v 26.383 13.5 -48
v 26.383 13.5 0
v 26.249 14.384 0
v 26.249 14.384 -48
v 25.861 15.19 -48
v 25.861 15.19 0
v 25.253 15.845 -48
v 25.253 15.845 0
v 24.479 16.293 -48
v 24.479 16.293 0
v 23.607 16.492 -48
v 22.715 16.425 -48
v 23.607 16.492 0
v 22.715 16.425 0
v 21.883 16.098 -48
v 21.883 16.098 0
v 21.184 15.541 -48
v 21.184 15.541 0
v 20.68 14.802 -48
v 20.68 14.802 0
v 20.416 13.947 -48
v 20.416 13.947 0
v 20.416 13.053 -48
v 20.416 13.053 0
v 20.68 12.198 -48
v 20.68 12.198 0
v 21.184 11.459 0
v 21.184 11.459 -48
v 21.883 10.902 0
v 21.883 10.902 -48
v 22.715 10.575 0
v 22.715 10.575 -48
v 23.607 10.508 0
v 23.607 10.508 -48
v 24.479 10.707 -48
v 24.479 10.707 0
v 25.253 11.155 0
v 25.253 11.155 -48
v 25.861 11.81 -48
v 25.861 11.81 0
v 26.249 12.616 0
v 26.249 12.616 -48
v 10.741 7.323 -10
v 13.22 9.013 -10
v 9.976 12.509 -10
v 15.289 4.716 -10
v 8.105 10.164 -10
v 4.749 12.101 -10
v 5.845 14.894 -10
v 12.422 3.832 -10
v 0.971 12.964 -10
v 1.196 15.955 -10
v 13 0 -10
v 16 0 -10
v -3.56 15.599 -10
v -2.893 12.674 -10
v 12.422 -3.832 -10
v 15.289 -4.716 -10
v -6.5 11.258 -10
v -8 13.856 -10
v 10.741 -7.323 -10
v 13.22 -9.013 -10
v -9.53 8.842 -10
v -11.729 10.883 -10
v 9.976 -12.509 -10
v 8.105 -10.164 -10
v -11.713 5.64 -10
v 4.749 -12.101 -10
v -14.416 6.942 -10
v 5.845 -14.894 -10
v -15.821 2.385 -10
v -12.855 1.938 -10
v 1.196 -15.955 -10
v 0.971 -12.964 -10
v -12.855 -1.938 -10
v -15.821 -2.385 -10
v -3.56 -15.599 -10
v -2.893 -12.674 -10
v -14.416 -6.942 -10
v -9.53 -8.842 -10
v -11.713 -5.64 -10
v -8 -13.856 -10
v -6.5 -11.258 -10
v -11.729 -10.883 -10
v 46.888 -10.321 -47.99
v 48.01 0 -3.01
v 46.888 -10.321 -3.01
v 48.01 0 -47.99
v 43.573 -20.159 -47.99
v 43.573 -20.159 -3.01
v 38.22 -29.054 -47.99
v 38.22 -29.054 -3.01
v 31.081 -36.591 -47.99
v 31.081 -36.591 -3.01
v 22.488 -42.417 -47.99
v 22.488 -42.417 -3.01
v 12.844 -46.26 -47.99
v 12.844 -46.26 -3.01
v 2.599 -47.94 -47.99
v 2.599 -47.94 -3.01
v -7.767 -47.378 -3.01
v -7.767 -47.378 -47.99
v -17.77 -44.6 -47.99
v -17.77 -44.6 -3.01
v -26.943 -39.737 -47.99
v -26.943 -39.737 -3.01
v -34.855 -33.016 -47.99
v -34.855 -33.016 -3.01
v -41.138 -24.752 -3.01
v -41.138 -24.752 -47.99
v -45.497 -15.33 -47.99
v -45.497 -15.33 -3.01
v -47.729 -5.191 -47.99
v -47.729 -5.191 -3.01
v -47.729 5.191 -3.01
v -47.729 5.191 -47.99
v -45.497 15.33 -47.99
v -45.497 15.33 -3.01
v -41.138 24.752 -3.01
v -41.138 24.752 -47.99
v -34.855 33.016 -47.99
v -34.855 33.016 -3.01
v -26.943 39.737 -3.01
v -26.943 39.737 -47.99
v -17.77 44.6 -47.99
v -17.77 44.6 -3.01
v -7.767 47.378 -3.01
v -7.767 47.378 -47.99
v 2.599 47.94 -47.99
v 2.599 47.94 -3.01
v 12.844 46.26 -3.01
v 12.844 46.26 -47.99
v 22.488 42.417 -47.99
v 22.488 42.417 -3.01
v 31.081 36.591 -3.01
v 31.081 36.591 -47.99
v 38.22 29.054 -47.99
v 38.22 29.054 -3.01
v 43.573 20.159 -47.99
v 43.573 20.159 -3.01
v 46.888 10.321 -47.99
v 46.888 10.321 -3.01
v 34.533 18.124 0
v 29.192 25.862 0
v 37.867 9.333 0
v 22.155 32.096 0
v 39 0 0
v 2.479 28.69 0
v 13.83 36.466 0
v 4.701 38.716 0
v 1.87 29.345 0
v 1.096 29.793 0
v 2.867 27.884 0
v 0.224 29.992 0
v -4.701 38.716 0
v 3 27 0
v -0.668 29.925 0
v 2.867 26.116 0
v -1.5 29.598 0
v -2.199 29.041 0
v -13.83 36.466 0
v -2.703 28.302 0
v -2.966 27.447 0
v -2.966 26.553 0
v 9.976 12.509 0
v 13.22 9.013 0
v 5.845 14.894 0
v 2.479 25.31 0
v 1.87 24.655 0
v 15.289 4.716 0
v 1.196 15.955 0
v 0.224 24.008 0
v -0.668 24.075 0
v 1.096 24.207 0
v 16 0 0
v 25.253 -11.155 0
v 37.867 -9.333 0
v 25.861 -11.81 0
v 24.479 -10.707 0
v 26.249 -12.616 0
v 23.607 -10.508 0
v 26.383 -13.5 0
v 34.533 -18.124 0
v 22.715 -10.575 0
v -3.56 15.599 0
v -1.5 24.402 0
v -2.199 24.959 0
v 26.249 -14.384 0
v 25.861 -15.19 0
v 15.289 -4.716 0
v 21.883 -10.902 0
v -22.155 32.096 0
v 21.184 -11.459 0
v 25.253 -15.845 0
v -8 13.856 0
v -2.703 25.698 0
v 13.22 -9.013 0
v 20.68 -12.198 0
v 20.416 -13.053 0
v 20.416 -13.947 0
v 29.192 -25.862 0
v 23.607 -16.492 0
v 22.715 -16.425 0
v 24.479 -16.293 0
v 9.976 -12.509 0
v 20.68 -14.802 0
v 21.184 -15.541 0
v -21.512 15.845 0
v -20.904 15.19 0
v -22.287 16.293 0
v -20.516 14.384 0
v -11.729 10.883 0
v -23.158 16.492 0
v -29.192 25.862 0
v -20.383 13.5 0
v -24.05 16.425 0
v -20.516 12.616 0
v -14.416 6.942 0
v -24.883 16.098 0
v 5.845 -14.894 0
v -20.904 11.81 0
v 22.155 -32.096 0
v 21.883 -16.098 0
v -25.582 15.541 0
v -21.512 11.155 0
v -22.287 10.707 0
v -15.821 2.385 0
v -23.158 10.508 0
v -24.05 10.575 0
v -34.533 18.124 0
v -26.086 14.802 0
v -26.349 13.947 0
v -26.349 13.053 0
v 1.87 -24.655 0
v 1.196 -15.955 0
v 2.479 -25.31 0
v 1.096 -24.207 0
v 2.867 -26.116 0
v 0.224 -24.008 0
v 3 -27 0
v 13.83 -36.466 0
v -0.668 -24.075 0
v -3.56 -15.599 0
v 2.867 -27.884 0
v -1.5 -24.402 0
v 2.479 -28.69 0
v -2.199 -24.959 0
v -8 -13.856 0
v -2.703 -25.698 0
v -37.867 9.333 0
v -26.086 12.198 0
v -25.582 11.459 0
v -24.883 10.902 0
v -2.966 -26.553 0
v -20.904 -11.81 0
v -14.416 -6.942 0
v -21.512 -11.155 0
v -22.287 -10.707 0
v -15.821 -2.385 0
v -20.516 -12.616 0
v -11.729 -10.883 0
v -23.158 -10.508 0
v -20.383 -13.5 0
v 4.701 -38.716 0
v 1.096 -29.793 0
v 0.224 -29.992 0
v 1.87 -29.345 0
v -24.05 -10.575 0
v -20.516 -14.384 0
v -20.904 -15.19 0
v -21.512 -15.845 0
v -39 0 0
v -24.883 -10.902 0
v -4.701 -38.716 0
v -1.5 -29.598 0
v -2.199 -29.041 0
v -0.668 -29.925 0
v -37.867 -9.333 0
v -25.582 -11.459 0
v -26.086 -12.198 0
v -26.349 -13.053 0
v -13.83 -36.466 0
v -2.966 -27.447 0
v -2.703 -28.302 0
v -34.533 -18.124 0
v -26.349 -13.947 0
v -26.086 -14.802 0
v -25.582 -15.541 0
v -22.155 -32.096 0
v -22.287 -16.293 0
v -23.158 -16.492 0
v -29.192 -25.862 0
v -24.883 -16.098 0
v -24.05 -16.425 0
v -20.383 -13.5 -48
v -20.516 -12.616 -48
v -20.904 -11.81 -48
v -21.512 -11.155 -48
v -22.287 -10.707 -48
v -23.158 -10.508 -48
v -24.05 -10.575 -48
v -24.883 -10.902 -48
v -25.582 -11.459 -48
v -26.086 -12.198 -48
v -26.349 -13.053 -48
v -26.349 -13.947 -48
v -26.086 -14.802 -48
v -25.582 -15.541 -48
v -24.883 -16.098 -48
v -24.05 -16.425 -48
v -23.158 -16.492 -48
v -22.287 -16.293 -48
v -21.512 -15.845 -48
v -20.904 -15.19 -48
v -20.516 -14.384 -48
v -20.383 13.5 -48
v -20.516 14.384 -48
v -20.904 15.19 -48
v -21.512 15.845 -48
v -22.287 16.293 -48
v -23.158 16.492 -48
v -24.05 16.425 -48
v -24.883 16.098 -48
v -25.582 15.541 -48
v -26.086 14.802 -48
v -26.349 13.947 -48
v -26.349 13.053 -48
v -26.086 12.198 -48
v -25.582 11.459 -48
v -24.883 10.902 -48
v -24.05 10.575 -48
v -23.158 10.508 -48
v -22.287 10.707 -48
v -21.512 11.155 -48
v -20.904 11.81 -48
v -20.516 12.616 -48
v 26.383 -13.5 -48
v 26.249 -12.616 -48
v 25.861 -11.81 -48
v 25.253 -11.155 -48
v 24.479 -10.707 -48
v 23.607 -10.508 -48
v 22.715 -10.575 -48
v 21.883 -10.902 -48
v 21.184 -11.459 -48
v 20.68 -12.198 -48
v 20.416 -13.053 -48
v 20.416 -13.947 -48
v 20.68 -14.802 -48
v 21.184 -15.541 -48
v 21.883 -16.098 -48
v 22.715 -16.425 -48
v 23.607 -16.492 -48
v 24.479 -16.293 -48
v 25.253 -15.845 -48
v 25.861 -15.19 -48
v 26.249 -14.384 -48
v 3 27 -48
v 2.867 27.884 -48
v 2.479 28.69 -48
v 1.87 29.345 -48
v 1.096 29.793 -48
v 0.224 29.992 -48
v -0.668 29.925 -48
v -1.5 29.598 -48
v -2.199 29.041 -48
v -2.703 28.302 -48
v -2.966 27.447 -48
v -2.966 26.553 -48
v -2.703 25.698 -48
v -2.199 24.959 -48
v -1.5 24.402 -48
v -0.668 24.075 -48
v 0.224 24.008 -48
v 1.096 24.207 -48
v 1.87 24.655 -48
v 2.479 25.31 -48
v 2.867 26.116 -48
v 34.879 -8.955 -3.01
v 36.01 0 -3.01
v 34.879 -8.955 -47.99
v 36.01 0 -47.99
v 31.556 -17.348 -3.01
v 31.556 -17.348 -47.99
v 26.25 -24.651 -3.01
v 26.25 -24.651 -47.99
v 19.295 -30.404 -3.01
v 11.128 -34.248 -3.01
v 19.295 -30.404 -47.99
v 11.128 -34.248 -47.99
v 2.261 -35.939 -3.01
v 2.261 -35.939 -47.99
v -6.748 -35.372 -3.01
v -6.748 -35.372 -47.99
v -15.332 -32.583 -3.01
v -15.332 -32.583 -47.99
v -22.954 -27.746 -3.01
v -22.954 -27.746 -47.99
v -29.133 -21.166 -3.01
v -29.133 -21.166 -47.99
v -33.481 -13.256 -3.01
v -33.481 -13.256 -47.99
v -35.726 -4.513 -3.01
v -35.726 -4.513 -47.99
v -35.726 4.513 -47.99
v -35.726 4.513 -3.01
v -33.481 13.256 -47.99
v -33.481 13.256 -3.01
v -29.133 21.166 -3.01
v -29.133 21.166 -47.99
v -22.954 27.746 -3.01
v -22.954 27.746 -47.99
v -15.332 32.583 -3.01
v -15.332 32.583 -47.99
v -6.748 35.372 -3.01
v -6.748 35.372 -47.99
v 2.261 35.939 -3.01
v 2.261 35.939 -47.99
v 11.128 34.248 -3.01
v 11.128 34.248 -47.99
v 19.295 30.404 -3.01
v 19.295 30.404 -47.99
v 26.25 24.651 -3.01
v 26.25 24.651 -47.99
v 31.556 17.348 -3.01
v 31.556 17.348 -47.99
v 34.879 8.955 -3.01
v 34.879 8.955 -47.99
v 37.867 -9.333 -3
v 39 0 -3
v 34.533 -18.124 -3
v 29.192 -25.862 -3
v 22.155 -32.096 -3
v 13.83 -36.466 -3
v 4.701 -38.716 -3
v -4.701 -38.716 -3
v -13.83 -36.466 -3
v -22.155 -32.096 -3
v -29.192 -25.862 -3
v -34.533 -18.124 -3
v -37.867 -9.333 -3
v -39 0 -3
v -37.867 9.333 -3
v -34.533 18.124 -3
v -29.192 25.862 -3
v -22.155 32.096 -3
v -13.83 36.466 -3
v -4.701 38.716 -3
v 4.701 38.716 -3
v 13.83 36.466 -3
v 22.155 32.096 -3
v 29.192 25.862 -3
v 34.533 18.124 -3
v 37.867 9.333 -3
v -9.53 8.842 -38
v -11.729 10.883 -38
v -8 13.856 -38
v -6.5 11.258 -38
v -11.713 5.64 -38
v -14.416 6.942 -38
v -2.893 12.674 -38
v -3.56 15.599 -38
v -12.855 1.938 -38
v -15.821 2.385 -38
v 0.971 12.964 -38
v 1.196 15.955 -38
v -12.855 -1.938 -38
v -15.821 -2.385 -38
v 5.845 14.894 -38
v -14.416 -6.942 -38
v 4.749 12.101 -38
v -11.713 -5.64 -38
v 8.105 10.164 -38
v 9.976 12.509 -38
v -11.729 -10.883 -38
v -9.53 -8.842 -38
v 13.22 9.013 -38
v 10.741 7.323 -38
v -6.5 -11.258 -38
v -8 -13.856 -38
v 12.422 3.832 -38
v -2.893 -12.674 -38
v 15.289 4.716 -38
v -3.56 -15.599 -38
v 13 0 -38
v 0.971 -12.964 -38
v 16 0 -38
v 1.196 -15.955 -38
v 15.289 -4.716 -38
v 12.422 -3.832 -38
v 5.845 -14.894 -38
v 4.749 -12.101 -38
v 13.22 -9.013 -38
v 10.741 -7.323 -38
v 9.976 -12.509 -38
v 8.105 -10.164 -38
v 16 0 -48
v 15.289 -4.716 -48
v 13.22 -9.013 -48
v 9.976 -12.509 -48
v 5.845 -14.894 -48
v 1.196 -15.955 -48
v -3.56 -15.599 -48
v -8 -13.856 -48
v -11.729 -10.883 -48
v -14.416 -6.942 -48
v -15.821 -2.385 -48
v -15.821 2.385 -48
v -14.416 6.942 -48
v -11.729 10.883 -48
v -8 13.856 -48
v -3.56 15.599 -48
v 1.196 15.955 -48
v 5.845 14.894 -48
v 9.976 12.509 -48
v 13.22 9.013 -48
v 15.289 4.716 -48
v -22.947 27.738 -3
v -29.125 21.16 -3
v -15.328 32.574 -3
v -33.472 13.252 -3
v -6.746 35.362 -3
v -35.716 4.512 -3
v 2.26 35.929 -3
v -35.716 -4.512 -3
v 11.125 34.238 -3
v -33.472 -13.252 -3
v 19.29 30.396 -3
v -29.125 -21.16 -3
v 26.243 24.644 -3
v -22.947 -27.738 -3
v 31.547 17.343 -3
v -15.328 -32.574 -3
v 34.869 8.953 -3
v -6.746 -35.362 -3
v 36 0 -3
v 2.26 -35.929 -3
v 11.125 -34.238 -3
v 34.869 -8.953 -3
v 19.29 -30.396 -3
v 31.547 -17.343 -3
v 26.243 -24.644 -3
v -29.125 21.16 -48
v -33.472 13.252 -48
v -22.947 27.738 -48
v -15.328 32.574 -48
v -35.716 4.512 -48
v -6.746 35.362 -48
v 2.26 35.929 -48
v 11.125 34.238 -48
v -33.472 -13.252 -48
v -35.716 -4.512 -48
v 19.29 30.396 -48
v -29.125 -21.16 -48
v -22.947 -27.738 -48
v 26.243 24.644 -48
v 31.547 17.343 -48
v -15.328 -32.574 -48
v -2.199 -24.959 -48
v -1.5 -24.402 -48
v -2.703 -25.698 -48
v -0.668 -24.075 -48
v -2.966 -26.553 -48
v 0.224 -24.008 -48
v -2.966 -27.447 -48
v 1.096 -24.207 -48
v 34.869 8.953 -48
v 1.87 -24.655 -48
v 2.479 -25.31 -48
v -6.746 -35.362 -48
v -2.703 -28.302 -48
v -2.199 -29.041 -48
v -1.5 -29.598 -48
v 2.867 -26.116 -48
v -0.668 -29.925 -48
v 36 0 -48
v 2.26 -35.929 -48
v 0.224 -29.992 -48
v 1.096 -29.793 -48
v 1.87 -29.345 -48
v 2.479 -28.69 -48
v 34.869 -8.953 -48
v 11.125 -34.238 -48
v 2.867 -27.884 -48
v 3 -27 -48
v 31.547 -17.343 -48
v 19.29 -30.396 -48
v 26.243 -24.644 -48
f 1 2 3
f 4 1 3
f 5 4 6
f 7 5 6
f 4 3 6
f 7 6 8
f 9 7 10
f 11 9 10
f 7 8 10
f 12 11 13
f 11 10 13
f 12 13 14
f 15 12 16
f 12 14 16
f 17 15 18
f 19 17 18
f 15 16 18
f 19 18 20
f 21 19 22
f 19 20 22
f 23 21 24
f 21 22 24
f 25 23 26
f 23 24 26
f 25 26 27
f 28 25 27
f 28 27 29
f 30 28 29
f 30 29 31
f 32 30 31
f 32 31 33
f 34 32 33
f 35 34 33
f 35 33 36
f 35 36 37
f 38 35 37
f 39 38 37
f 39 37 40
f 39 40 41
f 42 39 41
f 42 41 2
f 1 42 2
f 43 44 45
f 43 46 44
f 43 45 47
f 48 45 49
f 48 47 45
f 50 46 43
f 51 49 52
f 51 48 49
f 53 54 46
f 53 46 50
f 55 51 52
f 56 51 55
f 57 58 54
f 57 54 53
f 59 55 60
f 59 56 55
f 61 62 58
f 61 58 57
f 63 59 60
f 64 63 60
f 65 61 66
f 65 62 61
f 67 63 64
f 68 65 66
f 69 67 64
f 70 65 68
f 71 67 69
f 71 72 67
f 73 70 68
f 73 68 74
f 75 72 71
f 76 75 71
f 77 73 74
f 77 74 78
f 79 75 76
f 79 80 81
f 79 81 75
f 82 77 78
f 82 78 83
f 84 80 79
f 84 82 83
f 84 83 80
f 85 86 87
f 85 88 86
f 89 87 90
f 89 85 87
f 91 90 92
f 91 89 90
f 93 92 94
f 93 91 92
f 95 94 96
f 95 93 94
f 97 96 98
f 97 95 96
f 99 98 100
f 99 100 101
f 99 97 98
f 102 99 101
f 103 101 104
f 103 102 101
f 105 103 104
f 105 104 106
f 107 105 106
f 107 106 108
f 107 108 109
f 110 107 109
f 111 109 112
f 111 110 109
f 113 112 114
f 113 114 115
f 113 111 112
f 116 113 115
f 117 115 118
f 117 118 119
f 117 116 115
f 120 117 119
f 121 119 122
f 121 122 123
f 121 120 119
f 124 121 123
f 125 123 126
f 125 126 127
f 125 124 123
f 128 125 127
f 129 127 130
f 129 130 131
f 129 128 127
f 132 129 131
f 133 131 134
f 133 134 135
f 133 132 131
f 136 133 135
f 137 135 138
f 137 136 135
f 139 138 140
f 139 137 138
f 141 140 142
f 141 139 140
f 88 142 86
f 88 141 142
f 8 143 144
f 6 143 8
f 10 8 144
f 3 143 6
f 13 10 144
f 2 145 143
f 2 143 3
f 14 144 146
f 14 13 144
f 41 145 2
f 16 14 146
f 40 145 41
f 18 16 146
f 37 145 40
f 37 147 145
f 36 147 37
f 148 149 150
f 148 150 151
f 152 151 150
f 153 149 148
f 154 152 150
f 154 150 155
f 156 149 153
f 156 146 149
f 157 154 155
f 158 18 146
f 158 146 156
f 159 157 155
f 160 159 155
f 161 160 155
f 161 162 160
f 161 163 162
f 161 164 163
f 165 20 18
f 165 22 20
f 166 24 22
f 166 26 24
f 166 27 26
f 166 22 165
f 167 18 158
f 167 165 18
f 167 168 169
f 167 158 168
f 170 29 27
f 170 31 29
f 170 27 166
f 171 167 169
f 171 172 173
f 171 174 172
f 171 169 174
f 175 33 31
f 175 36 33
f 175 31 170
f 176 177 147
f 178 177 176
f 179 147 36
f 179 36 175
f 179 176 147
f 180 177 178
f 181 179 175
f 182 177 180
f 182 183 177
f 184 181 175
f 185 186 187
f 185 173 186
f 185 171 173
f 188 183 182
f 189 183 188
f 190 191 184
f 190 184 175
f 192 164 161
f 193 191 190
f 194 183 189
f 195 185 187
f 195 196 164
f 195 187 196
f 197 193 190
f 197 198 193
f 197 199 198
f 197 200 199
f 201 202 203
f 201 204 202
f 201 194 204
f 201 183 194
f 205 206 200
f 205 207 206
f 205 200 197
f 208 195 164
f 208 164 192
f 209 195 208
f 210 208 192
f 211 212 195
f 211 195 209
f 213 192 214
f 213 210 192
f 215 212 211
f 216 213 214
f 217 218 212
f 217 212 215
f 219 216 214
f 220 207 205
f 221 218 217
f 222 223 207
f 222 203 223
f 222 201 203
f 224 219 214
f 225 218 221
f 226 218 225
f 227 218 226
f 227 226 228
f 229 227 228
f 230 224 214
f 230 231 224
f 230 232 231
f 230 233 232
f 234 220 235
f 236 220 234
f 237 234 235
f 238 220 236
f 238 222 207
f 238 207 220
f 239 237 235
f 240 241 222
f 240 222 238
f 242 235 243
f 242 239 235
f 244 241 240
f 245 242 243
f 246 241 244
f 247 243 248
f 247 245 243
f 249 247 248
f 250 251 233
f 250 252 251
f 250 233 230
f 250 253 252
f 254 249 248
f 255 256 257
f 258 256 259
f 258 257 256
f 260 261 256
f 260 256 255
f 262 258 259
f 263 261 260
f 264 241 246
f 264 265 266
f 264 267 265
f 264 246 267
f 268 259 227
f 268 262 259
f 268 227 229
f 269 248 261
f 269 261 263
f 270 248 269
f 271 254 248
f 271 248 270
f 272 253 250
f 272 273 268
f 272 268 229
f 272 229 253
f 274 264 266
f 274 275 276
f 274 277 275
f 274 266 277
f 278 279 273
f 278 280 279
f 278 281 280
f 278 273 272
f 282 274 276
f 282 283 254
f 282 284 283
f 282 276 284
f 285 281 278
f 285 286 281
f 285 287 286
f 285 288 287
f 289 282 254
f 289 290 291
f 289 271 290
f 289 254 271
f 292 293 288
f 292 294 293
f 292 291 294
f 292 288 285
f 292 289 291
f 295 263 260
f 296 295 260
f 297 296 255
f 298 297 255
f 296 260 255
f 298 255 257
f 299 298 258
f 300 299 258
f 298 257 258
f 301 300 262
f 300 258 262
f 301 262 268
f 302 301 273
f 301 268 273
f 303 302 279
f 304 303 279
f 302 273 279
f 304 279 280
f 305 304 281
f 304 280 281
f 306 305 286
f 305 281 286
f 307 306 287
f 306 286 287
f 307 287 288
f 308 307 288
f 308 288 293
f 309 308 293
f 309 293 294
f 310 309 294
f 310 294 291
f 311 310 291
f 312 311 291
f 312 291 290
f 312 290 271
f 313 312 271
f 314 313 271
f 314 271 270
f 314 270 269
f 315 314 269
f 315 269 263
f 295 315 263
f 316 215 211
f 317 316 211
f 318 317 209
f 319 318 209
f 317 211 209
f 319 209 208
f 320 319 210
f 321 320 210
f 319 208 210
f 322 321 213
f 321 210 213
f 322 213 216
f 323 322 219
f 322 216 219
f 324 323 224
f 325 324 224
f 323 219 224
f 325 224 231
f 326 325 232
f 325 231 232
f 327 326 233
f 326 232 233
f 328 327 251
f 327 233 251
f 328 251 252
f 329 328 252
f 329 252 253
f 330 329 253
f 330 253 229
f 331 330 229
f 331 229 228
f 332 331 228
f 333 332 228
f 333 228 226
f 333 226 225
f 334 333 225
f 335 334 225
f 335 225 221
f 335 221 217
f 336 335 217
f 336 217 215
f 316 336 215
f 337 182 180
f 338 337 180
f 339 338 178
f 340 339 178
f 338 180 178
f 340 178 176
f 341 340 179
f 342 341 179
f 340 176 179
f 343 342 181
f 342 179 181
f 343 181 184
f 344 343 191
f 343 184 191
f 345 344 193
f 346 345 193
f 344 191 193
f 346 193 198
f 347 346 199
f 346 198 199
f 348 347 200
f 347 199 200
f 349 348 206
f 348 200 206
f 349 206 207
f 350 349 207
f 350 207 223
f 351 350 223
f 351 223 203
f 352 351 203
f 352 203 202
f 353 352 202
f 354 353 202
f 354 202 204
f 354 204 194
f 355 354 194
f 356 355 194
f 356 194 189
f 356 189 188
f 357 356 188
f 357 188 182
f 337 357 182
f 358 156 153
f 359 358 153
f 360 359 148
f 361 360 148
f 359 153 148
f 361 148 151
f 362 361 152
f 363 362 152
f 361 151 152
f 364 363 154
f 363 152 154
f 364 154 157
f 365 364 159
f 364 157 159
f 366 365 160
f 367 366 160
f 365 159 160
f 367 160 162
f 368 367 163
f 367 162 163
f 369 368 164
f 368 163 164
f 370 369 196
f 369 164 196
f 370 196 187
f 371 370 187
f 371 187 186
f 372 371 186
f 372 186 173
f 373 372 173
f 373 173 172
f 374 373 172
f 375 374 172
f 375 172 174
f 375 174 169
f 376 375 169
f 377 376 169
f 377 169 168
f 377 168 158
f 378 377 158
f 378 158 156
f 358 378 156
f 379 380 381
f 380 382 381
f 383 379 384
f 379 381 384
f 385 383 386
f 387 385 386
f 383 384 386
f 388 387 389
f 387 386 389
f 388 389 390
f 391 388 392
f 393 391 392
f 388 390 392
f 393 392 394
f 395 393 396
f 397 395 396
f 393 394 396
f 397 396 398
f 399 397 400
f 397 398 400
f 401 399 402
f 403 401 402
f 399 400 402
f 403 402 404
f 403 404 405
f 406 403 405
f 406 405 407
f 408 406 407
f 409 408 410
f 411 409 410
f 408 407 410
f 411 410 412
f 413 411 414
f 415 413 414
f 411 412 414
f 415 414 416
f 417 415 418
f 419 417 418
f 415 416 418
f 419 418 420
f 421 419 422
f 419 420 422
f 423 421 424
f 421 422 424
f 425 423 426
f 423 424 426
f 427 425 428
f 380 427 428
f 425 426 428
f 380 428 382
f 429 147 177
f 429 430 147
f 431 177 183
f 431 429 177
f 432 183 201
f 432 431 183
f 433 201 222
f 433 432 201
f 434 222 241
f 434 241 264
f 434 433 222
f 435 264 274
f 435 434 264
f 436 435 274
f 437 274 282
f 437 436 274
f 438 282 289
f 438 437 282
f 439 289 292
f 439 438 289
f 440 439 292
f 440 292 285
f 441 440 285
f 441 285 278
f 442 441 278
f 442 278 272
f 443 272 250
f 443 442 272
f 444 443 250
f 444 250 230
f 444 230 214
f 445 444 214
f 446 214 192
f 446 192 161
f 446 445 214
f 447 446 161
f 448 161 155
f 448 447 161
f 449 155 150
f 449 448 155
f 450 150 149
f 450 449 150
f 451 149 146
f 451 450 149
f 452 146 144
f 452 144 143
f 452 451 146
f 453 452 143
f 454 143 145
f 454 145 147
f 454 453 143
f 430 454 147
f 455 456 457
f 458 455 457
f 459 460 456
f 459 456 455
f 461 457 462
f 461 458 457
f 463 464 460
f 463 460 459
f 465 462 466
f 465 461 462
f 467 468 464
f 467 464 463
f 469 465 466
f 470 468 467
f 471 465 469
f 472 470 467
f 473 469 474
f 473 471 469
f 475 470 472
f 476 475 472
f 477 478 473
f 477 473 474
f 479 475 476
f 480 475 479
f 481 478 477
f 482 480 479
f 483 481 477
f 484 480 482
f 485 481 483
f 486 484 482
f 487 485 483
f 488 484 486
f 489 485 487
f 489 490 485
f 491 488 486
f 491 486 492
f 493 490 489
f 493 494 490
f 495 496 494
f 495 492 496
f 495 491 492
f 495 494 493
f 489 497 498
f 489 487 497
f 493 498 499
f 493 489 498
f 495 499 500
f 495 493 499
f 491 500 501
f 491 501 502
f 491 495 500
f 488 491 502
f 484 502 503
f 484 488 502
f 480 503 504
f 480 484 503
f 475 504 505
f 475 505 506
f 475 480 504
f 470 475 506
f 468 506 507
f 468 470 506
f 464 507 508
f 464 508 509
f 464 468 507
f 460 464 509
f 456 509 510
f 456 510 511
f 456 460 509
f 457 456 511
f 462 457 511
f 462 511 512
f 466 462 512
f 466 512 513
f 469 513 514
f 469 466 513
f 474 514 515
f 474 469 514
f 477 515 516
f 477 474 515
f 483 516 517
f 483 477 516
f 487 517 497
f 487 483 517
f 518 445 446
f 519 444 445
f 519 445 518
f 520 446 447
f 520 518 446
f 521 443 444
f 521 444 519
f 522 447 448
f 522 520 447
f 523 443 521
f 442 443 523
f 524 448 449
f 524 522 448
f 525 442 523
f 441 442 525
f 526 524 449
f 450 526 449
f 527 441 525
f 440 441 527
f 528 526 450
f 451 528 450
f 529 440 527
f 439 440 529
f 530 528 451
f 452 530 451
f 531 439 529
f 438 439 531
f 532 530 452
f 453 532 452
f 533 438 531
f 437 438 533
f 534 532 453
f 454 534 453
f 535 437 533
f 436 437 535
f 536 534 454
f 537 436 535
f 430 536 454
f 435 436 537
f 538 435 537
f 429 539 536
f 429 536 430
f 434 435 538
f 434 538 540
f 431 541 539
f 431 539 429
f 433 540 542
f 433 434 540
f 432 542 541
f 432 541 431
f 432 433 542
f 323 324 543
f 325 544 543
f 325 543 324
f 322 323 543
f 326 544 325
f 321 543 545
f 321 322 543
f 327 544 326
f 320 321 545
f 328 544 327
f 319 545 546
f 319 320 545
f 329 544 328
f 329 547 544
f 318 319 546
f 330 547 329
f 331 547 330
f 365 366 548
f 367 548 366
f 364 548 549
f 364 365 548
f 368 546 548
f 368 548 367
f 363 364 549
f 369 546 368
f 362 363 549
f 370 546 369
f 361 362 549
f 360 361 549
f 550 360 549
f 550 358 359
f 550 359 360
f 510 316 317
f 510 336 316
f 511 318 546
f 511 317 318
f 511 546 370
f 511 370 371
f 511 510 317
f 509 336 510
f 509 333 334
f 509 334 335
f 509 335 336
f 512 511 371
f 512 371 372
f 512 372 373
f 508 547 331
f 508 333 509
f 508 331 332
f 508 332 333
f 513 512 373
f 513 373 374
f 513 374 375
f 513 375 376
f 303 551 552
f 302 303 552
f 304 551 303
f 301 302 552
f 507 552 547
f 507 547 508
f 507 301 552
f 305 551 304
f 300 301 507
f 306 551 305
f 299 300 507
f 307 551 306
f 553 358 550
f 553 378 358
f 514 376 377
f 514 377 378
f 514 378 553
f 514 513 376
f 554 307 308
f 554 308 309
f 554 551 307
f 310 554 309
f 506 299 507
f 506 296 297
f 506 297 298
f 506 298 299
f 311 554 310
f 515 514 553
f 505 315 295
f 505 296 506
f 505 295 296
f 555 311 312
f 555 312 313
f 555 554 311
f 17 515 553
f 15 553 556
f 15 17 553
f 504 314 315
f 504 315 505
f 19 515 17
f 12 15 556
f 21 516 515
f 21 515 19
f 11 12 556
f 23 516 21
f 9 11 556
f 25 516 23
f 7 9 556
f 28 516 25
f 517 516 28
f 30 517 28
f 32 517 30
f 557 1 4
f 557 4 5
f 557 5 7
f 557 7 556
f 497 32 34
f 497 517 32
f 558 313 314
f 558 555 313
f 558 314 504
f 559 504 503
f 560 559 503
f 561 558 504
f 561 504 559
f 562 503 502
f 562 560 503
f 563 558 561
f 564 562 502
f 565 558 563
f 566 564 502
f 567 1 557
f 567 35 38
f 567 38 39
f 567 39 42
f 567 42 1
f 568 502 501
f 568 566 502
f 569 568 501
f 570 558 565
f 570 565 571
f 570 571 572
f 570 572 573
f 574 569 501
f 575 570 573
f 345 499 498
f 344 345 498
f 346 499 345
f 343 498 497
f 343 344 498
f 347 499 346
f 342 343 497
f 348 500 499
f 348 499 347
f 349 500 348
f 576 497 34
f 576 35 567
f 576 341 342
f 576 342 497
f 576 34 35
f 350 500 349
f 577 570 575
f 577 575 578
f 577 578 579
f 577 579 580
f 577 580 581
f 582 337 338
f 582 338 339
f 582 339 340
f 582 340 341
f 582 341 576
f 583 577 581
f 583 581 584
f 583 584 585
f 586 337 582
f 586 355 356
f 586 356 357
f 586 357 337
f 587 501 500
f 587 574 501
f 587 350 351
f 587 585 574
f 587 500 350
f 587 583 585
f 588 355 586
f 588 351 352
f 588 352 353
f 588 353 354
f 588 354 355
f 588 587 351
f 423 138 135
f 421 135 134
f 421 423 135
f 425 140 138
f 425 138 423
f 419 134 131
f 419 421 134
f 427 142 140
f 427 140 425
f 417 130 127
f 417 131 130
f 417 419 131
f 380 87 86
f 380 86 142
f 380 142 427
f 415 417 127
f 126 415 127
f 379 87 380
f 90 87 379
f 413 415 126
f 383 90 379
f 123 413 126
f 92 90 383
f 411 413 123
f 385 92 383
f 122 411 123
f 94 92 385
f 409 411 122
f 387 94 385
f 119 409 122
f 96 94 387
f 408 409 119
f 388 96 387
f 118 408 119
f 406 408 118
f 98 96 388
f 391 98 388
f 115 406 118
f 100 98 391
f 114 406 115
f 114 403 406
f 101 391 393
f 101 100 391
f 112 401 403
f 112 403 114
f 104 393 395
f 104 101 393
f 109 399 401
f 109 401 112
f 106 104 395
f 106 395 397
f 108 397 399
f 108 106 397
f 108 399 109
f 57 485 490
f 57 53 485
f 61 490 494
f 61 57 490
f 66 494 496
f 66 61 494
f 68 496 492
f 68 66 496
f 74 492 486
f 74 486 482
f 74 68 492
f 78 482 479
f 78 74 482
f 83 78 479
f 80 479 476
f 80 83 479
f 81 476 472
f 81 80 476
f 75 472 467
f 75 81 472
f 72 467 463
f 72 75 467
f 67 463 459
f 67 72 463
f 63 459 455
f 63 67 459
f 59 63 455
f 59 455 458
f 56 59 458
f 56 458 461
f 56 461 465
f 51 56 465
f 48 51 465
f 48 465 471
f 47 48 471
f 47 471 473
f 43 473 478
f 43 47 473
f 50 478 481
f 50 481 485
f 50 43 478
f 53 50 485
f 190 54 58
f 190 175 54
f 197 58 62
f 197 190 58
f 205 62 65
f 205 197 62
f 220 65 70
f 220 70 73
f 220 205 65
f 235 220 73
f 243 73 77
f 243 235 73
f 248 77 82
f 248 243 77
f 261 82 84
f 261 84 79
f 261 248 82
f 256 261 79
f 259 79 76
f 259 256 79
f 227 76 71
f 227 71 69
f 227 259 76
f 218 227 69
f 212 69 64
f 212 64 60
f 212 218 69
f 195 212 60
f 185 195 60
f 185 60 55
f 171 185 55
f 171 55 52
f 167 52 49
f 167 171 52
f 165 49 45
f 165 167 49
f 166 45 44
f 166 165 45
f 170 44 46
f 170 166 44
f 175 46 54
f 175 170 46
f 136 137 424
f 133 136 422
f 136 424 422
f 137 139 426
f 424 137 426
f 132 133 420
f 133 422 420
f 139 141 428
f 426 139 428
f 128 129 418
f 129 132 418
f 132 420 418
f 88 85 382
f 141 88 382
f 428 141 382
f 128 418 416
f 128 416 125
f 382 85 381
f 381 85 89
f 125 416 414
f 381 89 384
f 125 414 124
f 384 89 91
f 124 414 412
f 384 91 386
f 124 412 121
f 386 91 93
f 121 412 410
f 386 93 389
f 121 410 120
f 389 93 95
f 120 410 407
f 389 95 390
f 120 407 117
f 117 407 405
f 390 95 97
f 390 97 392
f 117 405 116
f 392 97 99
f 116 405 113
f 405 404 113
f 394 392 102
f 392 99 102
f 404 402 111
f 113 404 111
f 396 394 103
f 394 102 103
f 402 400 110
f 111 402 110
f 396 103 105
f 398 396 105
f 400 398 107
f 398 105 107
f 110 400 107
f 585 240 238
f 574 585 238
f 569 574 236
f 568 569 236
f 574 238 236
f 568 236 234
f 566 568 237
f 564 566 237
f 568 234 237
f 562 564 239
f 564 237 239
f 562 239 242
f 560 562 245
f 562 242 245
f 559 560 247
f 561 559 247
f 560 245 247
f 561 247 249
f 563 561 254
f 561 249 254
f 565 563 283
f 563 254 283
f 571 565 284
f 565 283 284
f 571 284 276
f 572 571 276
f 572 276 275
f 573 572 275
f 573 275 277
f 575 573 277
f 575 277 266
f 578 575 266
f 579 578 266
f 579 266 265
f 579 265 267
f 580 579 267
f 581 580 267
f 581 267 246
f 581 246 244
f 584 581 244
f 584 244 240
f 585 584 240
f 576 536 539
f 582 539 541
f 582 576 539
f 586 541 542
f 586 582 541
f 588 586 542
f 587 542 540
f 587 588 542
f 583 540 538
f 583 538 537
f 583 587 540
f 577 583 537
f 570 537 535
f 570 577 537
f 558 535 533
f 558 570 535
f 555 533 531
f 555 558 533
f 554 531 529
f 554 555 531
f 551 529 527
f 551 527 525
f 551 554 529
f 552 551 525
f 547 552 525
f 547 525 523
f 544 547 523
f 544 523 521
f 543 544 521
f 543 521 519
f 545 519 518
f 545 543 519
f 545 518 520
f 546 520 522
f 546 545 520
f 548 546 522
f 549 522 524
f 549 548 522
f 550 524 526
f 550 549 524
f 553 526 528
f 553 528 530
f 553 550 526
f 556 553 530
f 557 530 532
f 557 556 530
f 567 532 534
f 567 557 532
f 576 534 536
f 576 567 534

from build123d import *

# Parameters (mm, degrees)
SKETCH2_W          = 44.98
SKETCH2_H          = 12
SKETCH3_R          = 3
CUT_EXTRUDE1_DEPTH = 84.14998617


with BuildPart() as part:
    # Sketch1 → Revolve1 (revolve)
    with BuildSketch(Plane(origin=(0, 0, 0), x_dir=(0, 0, -1), z_dir=(1, 0, 0)), mode=Mode.PRIVATE) as revolve1_sk:
        Polygon((0, 16), (0, 39), (3, 39), (3, 36), (48, 36), (48, 16), (38, 16), (38, 13), (10, 13), (10, 16), align=None)
    revolve(revolve1_sk.sketch.rotate(Axis((0, 0, 0), (0, 0, -1)), 90), axis=Axis((0, 0, 0), (0, 0, -1)))

    # Sketch3 → Cut-Extrude1 (cut, through all)
    with BuildSketch(Plane.XY):
        with Locations((0, 27)):
            Circle(SKETCH3_R)
        with Locations((23.382685902, 13.5)):
            Circle(SKETCH3_R)
        with Locations((23.382685902, -13.5)):
            Circle(SKETCH3_R)
        with Locations((0, -27)):
            Circle(SKETCH3_R)
        with Locations((-23.382685902, -13.5)):
            Circle(SKETCH3_R)
        with Locations((-23.382685902, 13.5)):
            Circle(SKETCH3_R)
    extrude(amount=-CUT_EXTRUDE1_DEPTH, mode=Mode.SUBTRACT)


with BuildPart() as body_2:
    # Sketch2 → Revolve2 (revolve)
    with BuildSketch(Plane(origin=(0, 0, 0), x_dir=(0, 0, -1), z_dir=(1, 0, 0)), mode=Mode.PRIVATE) as revolve2_sk:
        with Locations((25.5, 42.01)):
            Rectangle(SKETCH2_W, SKETCH2_H)
    revolve(revolve2_sk.sketch.rotate(Axis((0, 0, 0), (0, 0, -1)), 90), axis=Axis((0, 0, 0), (0, 0, -1)))


solid = Compound([part.part, body_2.part])
